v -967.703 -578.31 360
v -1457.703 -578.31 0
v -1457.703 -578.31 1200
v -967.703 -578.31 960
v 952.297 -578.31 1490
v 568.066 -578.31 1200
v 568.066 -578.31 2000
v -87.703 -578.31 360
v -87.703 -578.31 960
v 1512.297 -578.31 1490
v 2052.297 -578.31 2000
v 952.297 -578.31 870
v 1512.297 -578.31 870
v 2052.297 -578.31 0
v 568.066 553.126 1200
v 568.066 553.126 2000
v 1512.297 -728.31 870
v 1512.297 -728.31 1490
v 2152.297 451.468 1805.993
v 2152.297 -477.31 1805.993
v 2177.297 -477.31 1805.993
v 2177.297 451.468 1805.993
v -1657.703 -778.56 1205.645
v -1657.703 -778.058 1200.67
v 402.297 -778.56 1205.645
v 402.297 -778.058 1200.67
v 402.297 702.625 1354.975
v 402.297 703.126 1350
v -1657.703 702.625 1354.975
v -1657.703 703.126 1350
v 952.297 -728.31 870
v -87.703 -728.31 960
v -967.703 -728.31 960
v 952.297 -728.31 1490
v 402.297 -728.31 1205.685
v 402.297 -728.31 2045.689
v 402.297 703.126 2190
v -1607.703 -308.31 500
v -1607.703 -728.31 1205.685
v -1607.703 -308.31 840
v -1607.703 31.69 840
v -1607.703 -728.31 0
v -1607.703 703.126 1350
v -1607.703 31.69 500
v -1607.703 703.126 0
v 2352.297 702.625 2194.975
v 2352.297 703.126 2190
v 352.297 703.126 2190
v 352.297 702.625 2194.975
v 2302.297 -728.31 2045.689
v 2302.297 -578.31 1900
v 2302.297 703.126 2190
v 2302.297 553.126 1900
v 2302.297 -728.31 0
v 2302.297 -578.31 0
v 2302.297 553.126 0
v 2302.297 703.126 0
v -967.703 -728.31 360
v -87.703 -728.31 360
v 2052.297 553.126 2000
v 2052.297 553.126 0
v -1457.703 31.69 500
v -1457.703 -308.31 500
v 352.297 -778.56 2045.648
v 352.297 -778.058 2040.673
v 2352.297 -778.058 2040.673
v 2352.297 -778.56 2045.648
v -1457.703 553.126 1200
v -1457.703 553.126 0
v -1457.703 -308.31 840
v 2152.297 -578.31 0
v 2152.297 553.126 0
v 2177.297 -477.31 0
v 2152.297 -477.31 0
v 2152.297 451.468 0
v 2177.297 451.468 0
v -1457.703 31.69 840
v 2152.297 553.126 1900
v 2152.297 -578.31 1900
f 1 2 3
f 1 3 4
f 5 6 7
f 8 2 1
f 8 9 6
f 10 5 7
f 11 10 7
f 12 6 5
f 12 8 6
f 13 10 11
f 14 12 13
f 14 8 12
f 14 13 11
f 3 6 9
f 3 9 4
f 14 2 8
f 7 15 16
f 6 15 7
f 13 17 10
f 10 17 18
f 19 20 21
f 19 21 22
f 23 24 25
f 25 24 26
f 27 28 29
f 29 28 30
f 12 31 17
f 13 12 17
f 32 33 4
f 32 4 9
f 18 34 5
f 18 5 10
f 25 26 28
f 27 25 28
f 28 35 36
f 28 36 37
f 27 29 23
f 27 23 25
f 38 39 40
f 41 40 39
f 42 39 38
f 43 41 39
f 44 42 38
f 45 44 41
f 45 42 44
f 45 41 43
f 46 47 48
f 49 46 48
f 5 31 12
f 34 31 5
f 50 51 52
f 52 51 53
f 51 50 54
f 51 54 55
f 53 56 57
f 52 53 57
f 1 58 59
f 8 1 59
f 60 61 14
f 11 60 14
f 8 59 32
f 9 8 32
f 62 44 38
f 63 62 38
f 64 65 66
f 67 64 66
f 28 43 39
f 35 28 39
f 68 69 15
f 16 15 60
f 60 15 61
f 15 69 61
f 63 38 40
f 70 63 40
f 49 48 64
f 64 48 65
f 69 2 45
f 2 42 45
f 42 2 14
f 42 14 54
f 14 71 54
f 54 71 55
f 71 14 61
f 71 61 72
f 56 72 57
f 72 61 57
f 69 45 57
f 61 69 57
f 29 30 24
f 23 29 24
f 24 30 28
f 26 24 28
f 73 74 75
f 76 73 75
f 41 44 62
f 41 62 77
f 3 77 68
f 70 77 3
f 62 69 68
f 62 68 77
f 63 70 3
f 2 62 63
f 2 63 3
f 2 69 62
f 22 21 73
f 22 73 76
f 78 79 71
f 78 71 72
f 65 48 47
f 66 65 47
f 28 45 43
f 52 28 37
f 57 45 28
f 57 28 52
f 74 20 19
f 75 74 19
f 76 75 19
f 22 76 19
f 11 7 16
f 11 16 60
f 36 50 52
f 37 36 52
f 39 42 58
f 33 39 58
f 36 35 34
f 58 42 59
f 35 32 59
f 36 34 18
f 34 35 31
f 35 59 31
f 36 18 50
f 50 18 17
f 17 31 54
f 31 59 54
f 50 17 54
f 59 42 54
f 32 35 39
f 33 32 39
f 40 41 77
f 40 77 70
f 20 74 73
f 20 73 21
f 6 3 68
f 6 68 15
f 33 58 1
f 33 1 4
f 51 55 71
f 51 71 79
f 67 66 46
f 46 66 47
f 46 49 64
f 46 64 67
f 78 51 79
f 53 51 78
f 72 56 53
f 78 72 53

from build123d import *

# Parameters (mm, degrees)
F0_W      = 1900
F0_H      = 1431.4363771724
F1_DEPTH  = 2190
F0_W_2    = 2010
F2_DEPTH  = 1350
F3_W      = 1131.4363771724
F3_H      = 1900
F4_DEPTH  = 150
F6_DEPTH  = 1900
F8_DEPTH  = 2010
F9_W      = 3510
F9_H      = 1131.4363771724
F10_DEPTH = 1200
F11_W     = 1484.2306598212
F11_H     = 1131.4363771724
F12_DEPTH = 800
F13_W     = 880
F13_H     = 600
F13_W_2   = 560
F13_H_2   = 620
F14_DEPTH = 150
F15_W     = 340
F15_H     = 340
F16_DEPTH = 150
F17_W     = 928.7782609463
F17_H     = 1805.9933185577
F18_DEPTH = 25
F19_W     = 1900
F19_H     = 1438.6924120027
F20_DEPTH = 5
F21_W     = 2010
F21_H     = 1438.6927541941
F22_DEPTH = 5


with BuildPart() as f1:
    # F0 (on Top) → F1 (new body)
    with BuildSketch(Plane.XY):
        with Locations((1352.2967203642, -12.5920064747)):
            Rectangle(F0_W, F0_H)
    extrude(amount=F1_DEPTH)

    # F0 (on Top) → F2 (join)
    with BuildSketch(Plane.XY):
        with Locations((-602.7032796358, -12.5920064747)):
            Rectangle(F0_W_2, F0_H)
    extrude(amount=F2_DEPTH)

    # F3 (on face) → F4 (cut)
    with BuildSketch(Plane.YZ.offset(2302.2967203642)):
        with Locations((-12.5920064747, 950)):
            Rectangle(F3_W, F3_H)
    extrude(amount=-F4_DEPTH, mode=Mode.SUBTRACT)

    # F5 (on face) → F6 (cut)
    with BuildSketch(Plane.YZ.offset(2302.2967203642)):
        Polygon((-728.3101950609, 2045.6886890728), (703.1261821115, 2190), (-728.3101950609, 2190), align=None)
    extrude(amount=-F6_DEPTH, mode=Mode.SUBTRACT)

    # F7 (on face) → F8 (cut)
    with BuildSketch(Plane(origin=(-1607.7032796358, 0, 0), x_dir=(0, -1, 0), z_dir=(-1, 0, 0))):
        Polygon((728.3101950609, 1350), (-703.1261821115, 1350), (728.3101950609, 1205.6852776806), align=None)
    extrude(amount=-F8_DEPTH, mode=Mode.SUBTRACT)

    # F9 (on face) → F10 (cut)
    with BuildSketch(Plane(origin=(0, 0, 0), x_dir=(1, 0, 0), z_dir=(0, 0, -1))):
        with Locations((297.2967203642, 12.5920064747)):
            Rectangle(F9_W, F9_H)
    extrude(amount=-F10_DEPTH, mode=Mode.SUBTRACT)

    # F11 (on face) → F12 (cut)
    with BuildSketch(Plane(origin=(0, 0, 1200), x_dir=(1, 0, 0), z_dir=(0, 0, -1))):
        with Locations((1310.1813904536, 12.5920064747)):
            Rectangle(F11_W, F11_H)
    extrude(amount=-F12_DEPTH, mode=Mode.SUBTRACT)

    # F13 (on face) → F14 (cut)
    with BuildSketch(Plane.XZ.offset(728.3101950609)):
        with Locations((-527.7032796358, 660)):
            Rectangle(F13_W, F13_H)
        with Locations((1232.2967203642, 1180)):
            Rectangle(F13_W_2, F13_H_2)
    extrude(amount=-F14_DEPTH, mode=Mode.SUBTRACT)

    # F15 (on face) → F16 (cut)
    with BuildSketch(Plane(origin=(-1607.7032796358, 0, 0), x_dir=(0, -1, 0), z_dir=(-1, 0, 0))):
        with Locations((138.3101950609, 670)):
            Rectangle(F15_W, F15_H)
    extrude(amount=-F16_DEPTH, mode=Mode.SUBTRACT)


with BuildPart() as f18:
    # F17 (on face) → F18 (new body)
    with BuildSketch(Plane.YZ.offset(2152.2967203642)):
        with Locations((-12.9206627607, 902.9966592789)):
            Rectangle(F17_W, F17_H)
    extrude(amount=F18_DEPTH)


with BuildPart() as f20:
    # F19 (on face) → F20 (new body)
    with BuildSketch(Plane(origin=(0, -211.4904682167, 2097.792249862), x_dir=(1, 0, 0), z_dir=(0, -0.1003072719, 0.9949565072))):
        Polygon((2352.2967203642, -569.439516308), (2352.2967203642, 919.2528956946), (2302.2967203642, 919.2528956946), (2302.2967203642, -519.439516308), (402.2967203642, -519.439516308), (402.2967203642, 919.2528956946), (352.2967203642, 919.2528956946), (352.2967203642, -569.439516308), align=None)
        with Locations((1352.2967203642, 199.9066896933)):
            Rectangle(F19_W, F19_H)
    extrude(amount=F20_DEPTH)


with BuildPart() as f22:
    # F21 (on face) → F22 (new body)
    with BuildSketch(Plane(origin=(0, -127.6601047371, 1266.2416896725), x_dir=(1, 0, 0), z_dir=(0, -0.1003096192, 0.9949562705))):
        with Locations((-602.7032796358, 115.6514126991)):
            Rectangle(F21_W, F21_H)
        Polygon((-1607.7032796358, 834.9977897962), (-1657.7032796358, 834.9977897962), (-1657.7032796358, -653.6949643979), (402.2967203642, -653.6949643979), (402.2967203642, -603.6949643979), (-1607.7032796358, -603.6949643979), align=None)
    extrude(amount=F22_DEPTH)


solid = Compound([f1.part, f18.part, f20.part, f22.part])
